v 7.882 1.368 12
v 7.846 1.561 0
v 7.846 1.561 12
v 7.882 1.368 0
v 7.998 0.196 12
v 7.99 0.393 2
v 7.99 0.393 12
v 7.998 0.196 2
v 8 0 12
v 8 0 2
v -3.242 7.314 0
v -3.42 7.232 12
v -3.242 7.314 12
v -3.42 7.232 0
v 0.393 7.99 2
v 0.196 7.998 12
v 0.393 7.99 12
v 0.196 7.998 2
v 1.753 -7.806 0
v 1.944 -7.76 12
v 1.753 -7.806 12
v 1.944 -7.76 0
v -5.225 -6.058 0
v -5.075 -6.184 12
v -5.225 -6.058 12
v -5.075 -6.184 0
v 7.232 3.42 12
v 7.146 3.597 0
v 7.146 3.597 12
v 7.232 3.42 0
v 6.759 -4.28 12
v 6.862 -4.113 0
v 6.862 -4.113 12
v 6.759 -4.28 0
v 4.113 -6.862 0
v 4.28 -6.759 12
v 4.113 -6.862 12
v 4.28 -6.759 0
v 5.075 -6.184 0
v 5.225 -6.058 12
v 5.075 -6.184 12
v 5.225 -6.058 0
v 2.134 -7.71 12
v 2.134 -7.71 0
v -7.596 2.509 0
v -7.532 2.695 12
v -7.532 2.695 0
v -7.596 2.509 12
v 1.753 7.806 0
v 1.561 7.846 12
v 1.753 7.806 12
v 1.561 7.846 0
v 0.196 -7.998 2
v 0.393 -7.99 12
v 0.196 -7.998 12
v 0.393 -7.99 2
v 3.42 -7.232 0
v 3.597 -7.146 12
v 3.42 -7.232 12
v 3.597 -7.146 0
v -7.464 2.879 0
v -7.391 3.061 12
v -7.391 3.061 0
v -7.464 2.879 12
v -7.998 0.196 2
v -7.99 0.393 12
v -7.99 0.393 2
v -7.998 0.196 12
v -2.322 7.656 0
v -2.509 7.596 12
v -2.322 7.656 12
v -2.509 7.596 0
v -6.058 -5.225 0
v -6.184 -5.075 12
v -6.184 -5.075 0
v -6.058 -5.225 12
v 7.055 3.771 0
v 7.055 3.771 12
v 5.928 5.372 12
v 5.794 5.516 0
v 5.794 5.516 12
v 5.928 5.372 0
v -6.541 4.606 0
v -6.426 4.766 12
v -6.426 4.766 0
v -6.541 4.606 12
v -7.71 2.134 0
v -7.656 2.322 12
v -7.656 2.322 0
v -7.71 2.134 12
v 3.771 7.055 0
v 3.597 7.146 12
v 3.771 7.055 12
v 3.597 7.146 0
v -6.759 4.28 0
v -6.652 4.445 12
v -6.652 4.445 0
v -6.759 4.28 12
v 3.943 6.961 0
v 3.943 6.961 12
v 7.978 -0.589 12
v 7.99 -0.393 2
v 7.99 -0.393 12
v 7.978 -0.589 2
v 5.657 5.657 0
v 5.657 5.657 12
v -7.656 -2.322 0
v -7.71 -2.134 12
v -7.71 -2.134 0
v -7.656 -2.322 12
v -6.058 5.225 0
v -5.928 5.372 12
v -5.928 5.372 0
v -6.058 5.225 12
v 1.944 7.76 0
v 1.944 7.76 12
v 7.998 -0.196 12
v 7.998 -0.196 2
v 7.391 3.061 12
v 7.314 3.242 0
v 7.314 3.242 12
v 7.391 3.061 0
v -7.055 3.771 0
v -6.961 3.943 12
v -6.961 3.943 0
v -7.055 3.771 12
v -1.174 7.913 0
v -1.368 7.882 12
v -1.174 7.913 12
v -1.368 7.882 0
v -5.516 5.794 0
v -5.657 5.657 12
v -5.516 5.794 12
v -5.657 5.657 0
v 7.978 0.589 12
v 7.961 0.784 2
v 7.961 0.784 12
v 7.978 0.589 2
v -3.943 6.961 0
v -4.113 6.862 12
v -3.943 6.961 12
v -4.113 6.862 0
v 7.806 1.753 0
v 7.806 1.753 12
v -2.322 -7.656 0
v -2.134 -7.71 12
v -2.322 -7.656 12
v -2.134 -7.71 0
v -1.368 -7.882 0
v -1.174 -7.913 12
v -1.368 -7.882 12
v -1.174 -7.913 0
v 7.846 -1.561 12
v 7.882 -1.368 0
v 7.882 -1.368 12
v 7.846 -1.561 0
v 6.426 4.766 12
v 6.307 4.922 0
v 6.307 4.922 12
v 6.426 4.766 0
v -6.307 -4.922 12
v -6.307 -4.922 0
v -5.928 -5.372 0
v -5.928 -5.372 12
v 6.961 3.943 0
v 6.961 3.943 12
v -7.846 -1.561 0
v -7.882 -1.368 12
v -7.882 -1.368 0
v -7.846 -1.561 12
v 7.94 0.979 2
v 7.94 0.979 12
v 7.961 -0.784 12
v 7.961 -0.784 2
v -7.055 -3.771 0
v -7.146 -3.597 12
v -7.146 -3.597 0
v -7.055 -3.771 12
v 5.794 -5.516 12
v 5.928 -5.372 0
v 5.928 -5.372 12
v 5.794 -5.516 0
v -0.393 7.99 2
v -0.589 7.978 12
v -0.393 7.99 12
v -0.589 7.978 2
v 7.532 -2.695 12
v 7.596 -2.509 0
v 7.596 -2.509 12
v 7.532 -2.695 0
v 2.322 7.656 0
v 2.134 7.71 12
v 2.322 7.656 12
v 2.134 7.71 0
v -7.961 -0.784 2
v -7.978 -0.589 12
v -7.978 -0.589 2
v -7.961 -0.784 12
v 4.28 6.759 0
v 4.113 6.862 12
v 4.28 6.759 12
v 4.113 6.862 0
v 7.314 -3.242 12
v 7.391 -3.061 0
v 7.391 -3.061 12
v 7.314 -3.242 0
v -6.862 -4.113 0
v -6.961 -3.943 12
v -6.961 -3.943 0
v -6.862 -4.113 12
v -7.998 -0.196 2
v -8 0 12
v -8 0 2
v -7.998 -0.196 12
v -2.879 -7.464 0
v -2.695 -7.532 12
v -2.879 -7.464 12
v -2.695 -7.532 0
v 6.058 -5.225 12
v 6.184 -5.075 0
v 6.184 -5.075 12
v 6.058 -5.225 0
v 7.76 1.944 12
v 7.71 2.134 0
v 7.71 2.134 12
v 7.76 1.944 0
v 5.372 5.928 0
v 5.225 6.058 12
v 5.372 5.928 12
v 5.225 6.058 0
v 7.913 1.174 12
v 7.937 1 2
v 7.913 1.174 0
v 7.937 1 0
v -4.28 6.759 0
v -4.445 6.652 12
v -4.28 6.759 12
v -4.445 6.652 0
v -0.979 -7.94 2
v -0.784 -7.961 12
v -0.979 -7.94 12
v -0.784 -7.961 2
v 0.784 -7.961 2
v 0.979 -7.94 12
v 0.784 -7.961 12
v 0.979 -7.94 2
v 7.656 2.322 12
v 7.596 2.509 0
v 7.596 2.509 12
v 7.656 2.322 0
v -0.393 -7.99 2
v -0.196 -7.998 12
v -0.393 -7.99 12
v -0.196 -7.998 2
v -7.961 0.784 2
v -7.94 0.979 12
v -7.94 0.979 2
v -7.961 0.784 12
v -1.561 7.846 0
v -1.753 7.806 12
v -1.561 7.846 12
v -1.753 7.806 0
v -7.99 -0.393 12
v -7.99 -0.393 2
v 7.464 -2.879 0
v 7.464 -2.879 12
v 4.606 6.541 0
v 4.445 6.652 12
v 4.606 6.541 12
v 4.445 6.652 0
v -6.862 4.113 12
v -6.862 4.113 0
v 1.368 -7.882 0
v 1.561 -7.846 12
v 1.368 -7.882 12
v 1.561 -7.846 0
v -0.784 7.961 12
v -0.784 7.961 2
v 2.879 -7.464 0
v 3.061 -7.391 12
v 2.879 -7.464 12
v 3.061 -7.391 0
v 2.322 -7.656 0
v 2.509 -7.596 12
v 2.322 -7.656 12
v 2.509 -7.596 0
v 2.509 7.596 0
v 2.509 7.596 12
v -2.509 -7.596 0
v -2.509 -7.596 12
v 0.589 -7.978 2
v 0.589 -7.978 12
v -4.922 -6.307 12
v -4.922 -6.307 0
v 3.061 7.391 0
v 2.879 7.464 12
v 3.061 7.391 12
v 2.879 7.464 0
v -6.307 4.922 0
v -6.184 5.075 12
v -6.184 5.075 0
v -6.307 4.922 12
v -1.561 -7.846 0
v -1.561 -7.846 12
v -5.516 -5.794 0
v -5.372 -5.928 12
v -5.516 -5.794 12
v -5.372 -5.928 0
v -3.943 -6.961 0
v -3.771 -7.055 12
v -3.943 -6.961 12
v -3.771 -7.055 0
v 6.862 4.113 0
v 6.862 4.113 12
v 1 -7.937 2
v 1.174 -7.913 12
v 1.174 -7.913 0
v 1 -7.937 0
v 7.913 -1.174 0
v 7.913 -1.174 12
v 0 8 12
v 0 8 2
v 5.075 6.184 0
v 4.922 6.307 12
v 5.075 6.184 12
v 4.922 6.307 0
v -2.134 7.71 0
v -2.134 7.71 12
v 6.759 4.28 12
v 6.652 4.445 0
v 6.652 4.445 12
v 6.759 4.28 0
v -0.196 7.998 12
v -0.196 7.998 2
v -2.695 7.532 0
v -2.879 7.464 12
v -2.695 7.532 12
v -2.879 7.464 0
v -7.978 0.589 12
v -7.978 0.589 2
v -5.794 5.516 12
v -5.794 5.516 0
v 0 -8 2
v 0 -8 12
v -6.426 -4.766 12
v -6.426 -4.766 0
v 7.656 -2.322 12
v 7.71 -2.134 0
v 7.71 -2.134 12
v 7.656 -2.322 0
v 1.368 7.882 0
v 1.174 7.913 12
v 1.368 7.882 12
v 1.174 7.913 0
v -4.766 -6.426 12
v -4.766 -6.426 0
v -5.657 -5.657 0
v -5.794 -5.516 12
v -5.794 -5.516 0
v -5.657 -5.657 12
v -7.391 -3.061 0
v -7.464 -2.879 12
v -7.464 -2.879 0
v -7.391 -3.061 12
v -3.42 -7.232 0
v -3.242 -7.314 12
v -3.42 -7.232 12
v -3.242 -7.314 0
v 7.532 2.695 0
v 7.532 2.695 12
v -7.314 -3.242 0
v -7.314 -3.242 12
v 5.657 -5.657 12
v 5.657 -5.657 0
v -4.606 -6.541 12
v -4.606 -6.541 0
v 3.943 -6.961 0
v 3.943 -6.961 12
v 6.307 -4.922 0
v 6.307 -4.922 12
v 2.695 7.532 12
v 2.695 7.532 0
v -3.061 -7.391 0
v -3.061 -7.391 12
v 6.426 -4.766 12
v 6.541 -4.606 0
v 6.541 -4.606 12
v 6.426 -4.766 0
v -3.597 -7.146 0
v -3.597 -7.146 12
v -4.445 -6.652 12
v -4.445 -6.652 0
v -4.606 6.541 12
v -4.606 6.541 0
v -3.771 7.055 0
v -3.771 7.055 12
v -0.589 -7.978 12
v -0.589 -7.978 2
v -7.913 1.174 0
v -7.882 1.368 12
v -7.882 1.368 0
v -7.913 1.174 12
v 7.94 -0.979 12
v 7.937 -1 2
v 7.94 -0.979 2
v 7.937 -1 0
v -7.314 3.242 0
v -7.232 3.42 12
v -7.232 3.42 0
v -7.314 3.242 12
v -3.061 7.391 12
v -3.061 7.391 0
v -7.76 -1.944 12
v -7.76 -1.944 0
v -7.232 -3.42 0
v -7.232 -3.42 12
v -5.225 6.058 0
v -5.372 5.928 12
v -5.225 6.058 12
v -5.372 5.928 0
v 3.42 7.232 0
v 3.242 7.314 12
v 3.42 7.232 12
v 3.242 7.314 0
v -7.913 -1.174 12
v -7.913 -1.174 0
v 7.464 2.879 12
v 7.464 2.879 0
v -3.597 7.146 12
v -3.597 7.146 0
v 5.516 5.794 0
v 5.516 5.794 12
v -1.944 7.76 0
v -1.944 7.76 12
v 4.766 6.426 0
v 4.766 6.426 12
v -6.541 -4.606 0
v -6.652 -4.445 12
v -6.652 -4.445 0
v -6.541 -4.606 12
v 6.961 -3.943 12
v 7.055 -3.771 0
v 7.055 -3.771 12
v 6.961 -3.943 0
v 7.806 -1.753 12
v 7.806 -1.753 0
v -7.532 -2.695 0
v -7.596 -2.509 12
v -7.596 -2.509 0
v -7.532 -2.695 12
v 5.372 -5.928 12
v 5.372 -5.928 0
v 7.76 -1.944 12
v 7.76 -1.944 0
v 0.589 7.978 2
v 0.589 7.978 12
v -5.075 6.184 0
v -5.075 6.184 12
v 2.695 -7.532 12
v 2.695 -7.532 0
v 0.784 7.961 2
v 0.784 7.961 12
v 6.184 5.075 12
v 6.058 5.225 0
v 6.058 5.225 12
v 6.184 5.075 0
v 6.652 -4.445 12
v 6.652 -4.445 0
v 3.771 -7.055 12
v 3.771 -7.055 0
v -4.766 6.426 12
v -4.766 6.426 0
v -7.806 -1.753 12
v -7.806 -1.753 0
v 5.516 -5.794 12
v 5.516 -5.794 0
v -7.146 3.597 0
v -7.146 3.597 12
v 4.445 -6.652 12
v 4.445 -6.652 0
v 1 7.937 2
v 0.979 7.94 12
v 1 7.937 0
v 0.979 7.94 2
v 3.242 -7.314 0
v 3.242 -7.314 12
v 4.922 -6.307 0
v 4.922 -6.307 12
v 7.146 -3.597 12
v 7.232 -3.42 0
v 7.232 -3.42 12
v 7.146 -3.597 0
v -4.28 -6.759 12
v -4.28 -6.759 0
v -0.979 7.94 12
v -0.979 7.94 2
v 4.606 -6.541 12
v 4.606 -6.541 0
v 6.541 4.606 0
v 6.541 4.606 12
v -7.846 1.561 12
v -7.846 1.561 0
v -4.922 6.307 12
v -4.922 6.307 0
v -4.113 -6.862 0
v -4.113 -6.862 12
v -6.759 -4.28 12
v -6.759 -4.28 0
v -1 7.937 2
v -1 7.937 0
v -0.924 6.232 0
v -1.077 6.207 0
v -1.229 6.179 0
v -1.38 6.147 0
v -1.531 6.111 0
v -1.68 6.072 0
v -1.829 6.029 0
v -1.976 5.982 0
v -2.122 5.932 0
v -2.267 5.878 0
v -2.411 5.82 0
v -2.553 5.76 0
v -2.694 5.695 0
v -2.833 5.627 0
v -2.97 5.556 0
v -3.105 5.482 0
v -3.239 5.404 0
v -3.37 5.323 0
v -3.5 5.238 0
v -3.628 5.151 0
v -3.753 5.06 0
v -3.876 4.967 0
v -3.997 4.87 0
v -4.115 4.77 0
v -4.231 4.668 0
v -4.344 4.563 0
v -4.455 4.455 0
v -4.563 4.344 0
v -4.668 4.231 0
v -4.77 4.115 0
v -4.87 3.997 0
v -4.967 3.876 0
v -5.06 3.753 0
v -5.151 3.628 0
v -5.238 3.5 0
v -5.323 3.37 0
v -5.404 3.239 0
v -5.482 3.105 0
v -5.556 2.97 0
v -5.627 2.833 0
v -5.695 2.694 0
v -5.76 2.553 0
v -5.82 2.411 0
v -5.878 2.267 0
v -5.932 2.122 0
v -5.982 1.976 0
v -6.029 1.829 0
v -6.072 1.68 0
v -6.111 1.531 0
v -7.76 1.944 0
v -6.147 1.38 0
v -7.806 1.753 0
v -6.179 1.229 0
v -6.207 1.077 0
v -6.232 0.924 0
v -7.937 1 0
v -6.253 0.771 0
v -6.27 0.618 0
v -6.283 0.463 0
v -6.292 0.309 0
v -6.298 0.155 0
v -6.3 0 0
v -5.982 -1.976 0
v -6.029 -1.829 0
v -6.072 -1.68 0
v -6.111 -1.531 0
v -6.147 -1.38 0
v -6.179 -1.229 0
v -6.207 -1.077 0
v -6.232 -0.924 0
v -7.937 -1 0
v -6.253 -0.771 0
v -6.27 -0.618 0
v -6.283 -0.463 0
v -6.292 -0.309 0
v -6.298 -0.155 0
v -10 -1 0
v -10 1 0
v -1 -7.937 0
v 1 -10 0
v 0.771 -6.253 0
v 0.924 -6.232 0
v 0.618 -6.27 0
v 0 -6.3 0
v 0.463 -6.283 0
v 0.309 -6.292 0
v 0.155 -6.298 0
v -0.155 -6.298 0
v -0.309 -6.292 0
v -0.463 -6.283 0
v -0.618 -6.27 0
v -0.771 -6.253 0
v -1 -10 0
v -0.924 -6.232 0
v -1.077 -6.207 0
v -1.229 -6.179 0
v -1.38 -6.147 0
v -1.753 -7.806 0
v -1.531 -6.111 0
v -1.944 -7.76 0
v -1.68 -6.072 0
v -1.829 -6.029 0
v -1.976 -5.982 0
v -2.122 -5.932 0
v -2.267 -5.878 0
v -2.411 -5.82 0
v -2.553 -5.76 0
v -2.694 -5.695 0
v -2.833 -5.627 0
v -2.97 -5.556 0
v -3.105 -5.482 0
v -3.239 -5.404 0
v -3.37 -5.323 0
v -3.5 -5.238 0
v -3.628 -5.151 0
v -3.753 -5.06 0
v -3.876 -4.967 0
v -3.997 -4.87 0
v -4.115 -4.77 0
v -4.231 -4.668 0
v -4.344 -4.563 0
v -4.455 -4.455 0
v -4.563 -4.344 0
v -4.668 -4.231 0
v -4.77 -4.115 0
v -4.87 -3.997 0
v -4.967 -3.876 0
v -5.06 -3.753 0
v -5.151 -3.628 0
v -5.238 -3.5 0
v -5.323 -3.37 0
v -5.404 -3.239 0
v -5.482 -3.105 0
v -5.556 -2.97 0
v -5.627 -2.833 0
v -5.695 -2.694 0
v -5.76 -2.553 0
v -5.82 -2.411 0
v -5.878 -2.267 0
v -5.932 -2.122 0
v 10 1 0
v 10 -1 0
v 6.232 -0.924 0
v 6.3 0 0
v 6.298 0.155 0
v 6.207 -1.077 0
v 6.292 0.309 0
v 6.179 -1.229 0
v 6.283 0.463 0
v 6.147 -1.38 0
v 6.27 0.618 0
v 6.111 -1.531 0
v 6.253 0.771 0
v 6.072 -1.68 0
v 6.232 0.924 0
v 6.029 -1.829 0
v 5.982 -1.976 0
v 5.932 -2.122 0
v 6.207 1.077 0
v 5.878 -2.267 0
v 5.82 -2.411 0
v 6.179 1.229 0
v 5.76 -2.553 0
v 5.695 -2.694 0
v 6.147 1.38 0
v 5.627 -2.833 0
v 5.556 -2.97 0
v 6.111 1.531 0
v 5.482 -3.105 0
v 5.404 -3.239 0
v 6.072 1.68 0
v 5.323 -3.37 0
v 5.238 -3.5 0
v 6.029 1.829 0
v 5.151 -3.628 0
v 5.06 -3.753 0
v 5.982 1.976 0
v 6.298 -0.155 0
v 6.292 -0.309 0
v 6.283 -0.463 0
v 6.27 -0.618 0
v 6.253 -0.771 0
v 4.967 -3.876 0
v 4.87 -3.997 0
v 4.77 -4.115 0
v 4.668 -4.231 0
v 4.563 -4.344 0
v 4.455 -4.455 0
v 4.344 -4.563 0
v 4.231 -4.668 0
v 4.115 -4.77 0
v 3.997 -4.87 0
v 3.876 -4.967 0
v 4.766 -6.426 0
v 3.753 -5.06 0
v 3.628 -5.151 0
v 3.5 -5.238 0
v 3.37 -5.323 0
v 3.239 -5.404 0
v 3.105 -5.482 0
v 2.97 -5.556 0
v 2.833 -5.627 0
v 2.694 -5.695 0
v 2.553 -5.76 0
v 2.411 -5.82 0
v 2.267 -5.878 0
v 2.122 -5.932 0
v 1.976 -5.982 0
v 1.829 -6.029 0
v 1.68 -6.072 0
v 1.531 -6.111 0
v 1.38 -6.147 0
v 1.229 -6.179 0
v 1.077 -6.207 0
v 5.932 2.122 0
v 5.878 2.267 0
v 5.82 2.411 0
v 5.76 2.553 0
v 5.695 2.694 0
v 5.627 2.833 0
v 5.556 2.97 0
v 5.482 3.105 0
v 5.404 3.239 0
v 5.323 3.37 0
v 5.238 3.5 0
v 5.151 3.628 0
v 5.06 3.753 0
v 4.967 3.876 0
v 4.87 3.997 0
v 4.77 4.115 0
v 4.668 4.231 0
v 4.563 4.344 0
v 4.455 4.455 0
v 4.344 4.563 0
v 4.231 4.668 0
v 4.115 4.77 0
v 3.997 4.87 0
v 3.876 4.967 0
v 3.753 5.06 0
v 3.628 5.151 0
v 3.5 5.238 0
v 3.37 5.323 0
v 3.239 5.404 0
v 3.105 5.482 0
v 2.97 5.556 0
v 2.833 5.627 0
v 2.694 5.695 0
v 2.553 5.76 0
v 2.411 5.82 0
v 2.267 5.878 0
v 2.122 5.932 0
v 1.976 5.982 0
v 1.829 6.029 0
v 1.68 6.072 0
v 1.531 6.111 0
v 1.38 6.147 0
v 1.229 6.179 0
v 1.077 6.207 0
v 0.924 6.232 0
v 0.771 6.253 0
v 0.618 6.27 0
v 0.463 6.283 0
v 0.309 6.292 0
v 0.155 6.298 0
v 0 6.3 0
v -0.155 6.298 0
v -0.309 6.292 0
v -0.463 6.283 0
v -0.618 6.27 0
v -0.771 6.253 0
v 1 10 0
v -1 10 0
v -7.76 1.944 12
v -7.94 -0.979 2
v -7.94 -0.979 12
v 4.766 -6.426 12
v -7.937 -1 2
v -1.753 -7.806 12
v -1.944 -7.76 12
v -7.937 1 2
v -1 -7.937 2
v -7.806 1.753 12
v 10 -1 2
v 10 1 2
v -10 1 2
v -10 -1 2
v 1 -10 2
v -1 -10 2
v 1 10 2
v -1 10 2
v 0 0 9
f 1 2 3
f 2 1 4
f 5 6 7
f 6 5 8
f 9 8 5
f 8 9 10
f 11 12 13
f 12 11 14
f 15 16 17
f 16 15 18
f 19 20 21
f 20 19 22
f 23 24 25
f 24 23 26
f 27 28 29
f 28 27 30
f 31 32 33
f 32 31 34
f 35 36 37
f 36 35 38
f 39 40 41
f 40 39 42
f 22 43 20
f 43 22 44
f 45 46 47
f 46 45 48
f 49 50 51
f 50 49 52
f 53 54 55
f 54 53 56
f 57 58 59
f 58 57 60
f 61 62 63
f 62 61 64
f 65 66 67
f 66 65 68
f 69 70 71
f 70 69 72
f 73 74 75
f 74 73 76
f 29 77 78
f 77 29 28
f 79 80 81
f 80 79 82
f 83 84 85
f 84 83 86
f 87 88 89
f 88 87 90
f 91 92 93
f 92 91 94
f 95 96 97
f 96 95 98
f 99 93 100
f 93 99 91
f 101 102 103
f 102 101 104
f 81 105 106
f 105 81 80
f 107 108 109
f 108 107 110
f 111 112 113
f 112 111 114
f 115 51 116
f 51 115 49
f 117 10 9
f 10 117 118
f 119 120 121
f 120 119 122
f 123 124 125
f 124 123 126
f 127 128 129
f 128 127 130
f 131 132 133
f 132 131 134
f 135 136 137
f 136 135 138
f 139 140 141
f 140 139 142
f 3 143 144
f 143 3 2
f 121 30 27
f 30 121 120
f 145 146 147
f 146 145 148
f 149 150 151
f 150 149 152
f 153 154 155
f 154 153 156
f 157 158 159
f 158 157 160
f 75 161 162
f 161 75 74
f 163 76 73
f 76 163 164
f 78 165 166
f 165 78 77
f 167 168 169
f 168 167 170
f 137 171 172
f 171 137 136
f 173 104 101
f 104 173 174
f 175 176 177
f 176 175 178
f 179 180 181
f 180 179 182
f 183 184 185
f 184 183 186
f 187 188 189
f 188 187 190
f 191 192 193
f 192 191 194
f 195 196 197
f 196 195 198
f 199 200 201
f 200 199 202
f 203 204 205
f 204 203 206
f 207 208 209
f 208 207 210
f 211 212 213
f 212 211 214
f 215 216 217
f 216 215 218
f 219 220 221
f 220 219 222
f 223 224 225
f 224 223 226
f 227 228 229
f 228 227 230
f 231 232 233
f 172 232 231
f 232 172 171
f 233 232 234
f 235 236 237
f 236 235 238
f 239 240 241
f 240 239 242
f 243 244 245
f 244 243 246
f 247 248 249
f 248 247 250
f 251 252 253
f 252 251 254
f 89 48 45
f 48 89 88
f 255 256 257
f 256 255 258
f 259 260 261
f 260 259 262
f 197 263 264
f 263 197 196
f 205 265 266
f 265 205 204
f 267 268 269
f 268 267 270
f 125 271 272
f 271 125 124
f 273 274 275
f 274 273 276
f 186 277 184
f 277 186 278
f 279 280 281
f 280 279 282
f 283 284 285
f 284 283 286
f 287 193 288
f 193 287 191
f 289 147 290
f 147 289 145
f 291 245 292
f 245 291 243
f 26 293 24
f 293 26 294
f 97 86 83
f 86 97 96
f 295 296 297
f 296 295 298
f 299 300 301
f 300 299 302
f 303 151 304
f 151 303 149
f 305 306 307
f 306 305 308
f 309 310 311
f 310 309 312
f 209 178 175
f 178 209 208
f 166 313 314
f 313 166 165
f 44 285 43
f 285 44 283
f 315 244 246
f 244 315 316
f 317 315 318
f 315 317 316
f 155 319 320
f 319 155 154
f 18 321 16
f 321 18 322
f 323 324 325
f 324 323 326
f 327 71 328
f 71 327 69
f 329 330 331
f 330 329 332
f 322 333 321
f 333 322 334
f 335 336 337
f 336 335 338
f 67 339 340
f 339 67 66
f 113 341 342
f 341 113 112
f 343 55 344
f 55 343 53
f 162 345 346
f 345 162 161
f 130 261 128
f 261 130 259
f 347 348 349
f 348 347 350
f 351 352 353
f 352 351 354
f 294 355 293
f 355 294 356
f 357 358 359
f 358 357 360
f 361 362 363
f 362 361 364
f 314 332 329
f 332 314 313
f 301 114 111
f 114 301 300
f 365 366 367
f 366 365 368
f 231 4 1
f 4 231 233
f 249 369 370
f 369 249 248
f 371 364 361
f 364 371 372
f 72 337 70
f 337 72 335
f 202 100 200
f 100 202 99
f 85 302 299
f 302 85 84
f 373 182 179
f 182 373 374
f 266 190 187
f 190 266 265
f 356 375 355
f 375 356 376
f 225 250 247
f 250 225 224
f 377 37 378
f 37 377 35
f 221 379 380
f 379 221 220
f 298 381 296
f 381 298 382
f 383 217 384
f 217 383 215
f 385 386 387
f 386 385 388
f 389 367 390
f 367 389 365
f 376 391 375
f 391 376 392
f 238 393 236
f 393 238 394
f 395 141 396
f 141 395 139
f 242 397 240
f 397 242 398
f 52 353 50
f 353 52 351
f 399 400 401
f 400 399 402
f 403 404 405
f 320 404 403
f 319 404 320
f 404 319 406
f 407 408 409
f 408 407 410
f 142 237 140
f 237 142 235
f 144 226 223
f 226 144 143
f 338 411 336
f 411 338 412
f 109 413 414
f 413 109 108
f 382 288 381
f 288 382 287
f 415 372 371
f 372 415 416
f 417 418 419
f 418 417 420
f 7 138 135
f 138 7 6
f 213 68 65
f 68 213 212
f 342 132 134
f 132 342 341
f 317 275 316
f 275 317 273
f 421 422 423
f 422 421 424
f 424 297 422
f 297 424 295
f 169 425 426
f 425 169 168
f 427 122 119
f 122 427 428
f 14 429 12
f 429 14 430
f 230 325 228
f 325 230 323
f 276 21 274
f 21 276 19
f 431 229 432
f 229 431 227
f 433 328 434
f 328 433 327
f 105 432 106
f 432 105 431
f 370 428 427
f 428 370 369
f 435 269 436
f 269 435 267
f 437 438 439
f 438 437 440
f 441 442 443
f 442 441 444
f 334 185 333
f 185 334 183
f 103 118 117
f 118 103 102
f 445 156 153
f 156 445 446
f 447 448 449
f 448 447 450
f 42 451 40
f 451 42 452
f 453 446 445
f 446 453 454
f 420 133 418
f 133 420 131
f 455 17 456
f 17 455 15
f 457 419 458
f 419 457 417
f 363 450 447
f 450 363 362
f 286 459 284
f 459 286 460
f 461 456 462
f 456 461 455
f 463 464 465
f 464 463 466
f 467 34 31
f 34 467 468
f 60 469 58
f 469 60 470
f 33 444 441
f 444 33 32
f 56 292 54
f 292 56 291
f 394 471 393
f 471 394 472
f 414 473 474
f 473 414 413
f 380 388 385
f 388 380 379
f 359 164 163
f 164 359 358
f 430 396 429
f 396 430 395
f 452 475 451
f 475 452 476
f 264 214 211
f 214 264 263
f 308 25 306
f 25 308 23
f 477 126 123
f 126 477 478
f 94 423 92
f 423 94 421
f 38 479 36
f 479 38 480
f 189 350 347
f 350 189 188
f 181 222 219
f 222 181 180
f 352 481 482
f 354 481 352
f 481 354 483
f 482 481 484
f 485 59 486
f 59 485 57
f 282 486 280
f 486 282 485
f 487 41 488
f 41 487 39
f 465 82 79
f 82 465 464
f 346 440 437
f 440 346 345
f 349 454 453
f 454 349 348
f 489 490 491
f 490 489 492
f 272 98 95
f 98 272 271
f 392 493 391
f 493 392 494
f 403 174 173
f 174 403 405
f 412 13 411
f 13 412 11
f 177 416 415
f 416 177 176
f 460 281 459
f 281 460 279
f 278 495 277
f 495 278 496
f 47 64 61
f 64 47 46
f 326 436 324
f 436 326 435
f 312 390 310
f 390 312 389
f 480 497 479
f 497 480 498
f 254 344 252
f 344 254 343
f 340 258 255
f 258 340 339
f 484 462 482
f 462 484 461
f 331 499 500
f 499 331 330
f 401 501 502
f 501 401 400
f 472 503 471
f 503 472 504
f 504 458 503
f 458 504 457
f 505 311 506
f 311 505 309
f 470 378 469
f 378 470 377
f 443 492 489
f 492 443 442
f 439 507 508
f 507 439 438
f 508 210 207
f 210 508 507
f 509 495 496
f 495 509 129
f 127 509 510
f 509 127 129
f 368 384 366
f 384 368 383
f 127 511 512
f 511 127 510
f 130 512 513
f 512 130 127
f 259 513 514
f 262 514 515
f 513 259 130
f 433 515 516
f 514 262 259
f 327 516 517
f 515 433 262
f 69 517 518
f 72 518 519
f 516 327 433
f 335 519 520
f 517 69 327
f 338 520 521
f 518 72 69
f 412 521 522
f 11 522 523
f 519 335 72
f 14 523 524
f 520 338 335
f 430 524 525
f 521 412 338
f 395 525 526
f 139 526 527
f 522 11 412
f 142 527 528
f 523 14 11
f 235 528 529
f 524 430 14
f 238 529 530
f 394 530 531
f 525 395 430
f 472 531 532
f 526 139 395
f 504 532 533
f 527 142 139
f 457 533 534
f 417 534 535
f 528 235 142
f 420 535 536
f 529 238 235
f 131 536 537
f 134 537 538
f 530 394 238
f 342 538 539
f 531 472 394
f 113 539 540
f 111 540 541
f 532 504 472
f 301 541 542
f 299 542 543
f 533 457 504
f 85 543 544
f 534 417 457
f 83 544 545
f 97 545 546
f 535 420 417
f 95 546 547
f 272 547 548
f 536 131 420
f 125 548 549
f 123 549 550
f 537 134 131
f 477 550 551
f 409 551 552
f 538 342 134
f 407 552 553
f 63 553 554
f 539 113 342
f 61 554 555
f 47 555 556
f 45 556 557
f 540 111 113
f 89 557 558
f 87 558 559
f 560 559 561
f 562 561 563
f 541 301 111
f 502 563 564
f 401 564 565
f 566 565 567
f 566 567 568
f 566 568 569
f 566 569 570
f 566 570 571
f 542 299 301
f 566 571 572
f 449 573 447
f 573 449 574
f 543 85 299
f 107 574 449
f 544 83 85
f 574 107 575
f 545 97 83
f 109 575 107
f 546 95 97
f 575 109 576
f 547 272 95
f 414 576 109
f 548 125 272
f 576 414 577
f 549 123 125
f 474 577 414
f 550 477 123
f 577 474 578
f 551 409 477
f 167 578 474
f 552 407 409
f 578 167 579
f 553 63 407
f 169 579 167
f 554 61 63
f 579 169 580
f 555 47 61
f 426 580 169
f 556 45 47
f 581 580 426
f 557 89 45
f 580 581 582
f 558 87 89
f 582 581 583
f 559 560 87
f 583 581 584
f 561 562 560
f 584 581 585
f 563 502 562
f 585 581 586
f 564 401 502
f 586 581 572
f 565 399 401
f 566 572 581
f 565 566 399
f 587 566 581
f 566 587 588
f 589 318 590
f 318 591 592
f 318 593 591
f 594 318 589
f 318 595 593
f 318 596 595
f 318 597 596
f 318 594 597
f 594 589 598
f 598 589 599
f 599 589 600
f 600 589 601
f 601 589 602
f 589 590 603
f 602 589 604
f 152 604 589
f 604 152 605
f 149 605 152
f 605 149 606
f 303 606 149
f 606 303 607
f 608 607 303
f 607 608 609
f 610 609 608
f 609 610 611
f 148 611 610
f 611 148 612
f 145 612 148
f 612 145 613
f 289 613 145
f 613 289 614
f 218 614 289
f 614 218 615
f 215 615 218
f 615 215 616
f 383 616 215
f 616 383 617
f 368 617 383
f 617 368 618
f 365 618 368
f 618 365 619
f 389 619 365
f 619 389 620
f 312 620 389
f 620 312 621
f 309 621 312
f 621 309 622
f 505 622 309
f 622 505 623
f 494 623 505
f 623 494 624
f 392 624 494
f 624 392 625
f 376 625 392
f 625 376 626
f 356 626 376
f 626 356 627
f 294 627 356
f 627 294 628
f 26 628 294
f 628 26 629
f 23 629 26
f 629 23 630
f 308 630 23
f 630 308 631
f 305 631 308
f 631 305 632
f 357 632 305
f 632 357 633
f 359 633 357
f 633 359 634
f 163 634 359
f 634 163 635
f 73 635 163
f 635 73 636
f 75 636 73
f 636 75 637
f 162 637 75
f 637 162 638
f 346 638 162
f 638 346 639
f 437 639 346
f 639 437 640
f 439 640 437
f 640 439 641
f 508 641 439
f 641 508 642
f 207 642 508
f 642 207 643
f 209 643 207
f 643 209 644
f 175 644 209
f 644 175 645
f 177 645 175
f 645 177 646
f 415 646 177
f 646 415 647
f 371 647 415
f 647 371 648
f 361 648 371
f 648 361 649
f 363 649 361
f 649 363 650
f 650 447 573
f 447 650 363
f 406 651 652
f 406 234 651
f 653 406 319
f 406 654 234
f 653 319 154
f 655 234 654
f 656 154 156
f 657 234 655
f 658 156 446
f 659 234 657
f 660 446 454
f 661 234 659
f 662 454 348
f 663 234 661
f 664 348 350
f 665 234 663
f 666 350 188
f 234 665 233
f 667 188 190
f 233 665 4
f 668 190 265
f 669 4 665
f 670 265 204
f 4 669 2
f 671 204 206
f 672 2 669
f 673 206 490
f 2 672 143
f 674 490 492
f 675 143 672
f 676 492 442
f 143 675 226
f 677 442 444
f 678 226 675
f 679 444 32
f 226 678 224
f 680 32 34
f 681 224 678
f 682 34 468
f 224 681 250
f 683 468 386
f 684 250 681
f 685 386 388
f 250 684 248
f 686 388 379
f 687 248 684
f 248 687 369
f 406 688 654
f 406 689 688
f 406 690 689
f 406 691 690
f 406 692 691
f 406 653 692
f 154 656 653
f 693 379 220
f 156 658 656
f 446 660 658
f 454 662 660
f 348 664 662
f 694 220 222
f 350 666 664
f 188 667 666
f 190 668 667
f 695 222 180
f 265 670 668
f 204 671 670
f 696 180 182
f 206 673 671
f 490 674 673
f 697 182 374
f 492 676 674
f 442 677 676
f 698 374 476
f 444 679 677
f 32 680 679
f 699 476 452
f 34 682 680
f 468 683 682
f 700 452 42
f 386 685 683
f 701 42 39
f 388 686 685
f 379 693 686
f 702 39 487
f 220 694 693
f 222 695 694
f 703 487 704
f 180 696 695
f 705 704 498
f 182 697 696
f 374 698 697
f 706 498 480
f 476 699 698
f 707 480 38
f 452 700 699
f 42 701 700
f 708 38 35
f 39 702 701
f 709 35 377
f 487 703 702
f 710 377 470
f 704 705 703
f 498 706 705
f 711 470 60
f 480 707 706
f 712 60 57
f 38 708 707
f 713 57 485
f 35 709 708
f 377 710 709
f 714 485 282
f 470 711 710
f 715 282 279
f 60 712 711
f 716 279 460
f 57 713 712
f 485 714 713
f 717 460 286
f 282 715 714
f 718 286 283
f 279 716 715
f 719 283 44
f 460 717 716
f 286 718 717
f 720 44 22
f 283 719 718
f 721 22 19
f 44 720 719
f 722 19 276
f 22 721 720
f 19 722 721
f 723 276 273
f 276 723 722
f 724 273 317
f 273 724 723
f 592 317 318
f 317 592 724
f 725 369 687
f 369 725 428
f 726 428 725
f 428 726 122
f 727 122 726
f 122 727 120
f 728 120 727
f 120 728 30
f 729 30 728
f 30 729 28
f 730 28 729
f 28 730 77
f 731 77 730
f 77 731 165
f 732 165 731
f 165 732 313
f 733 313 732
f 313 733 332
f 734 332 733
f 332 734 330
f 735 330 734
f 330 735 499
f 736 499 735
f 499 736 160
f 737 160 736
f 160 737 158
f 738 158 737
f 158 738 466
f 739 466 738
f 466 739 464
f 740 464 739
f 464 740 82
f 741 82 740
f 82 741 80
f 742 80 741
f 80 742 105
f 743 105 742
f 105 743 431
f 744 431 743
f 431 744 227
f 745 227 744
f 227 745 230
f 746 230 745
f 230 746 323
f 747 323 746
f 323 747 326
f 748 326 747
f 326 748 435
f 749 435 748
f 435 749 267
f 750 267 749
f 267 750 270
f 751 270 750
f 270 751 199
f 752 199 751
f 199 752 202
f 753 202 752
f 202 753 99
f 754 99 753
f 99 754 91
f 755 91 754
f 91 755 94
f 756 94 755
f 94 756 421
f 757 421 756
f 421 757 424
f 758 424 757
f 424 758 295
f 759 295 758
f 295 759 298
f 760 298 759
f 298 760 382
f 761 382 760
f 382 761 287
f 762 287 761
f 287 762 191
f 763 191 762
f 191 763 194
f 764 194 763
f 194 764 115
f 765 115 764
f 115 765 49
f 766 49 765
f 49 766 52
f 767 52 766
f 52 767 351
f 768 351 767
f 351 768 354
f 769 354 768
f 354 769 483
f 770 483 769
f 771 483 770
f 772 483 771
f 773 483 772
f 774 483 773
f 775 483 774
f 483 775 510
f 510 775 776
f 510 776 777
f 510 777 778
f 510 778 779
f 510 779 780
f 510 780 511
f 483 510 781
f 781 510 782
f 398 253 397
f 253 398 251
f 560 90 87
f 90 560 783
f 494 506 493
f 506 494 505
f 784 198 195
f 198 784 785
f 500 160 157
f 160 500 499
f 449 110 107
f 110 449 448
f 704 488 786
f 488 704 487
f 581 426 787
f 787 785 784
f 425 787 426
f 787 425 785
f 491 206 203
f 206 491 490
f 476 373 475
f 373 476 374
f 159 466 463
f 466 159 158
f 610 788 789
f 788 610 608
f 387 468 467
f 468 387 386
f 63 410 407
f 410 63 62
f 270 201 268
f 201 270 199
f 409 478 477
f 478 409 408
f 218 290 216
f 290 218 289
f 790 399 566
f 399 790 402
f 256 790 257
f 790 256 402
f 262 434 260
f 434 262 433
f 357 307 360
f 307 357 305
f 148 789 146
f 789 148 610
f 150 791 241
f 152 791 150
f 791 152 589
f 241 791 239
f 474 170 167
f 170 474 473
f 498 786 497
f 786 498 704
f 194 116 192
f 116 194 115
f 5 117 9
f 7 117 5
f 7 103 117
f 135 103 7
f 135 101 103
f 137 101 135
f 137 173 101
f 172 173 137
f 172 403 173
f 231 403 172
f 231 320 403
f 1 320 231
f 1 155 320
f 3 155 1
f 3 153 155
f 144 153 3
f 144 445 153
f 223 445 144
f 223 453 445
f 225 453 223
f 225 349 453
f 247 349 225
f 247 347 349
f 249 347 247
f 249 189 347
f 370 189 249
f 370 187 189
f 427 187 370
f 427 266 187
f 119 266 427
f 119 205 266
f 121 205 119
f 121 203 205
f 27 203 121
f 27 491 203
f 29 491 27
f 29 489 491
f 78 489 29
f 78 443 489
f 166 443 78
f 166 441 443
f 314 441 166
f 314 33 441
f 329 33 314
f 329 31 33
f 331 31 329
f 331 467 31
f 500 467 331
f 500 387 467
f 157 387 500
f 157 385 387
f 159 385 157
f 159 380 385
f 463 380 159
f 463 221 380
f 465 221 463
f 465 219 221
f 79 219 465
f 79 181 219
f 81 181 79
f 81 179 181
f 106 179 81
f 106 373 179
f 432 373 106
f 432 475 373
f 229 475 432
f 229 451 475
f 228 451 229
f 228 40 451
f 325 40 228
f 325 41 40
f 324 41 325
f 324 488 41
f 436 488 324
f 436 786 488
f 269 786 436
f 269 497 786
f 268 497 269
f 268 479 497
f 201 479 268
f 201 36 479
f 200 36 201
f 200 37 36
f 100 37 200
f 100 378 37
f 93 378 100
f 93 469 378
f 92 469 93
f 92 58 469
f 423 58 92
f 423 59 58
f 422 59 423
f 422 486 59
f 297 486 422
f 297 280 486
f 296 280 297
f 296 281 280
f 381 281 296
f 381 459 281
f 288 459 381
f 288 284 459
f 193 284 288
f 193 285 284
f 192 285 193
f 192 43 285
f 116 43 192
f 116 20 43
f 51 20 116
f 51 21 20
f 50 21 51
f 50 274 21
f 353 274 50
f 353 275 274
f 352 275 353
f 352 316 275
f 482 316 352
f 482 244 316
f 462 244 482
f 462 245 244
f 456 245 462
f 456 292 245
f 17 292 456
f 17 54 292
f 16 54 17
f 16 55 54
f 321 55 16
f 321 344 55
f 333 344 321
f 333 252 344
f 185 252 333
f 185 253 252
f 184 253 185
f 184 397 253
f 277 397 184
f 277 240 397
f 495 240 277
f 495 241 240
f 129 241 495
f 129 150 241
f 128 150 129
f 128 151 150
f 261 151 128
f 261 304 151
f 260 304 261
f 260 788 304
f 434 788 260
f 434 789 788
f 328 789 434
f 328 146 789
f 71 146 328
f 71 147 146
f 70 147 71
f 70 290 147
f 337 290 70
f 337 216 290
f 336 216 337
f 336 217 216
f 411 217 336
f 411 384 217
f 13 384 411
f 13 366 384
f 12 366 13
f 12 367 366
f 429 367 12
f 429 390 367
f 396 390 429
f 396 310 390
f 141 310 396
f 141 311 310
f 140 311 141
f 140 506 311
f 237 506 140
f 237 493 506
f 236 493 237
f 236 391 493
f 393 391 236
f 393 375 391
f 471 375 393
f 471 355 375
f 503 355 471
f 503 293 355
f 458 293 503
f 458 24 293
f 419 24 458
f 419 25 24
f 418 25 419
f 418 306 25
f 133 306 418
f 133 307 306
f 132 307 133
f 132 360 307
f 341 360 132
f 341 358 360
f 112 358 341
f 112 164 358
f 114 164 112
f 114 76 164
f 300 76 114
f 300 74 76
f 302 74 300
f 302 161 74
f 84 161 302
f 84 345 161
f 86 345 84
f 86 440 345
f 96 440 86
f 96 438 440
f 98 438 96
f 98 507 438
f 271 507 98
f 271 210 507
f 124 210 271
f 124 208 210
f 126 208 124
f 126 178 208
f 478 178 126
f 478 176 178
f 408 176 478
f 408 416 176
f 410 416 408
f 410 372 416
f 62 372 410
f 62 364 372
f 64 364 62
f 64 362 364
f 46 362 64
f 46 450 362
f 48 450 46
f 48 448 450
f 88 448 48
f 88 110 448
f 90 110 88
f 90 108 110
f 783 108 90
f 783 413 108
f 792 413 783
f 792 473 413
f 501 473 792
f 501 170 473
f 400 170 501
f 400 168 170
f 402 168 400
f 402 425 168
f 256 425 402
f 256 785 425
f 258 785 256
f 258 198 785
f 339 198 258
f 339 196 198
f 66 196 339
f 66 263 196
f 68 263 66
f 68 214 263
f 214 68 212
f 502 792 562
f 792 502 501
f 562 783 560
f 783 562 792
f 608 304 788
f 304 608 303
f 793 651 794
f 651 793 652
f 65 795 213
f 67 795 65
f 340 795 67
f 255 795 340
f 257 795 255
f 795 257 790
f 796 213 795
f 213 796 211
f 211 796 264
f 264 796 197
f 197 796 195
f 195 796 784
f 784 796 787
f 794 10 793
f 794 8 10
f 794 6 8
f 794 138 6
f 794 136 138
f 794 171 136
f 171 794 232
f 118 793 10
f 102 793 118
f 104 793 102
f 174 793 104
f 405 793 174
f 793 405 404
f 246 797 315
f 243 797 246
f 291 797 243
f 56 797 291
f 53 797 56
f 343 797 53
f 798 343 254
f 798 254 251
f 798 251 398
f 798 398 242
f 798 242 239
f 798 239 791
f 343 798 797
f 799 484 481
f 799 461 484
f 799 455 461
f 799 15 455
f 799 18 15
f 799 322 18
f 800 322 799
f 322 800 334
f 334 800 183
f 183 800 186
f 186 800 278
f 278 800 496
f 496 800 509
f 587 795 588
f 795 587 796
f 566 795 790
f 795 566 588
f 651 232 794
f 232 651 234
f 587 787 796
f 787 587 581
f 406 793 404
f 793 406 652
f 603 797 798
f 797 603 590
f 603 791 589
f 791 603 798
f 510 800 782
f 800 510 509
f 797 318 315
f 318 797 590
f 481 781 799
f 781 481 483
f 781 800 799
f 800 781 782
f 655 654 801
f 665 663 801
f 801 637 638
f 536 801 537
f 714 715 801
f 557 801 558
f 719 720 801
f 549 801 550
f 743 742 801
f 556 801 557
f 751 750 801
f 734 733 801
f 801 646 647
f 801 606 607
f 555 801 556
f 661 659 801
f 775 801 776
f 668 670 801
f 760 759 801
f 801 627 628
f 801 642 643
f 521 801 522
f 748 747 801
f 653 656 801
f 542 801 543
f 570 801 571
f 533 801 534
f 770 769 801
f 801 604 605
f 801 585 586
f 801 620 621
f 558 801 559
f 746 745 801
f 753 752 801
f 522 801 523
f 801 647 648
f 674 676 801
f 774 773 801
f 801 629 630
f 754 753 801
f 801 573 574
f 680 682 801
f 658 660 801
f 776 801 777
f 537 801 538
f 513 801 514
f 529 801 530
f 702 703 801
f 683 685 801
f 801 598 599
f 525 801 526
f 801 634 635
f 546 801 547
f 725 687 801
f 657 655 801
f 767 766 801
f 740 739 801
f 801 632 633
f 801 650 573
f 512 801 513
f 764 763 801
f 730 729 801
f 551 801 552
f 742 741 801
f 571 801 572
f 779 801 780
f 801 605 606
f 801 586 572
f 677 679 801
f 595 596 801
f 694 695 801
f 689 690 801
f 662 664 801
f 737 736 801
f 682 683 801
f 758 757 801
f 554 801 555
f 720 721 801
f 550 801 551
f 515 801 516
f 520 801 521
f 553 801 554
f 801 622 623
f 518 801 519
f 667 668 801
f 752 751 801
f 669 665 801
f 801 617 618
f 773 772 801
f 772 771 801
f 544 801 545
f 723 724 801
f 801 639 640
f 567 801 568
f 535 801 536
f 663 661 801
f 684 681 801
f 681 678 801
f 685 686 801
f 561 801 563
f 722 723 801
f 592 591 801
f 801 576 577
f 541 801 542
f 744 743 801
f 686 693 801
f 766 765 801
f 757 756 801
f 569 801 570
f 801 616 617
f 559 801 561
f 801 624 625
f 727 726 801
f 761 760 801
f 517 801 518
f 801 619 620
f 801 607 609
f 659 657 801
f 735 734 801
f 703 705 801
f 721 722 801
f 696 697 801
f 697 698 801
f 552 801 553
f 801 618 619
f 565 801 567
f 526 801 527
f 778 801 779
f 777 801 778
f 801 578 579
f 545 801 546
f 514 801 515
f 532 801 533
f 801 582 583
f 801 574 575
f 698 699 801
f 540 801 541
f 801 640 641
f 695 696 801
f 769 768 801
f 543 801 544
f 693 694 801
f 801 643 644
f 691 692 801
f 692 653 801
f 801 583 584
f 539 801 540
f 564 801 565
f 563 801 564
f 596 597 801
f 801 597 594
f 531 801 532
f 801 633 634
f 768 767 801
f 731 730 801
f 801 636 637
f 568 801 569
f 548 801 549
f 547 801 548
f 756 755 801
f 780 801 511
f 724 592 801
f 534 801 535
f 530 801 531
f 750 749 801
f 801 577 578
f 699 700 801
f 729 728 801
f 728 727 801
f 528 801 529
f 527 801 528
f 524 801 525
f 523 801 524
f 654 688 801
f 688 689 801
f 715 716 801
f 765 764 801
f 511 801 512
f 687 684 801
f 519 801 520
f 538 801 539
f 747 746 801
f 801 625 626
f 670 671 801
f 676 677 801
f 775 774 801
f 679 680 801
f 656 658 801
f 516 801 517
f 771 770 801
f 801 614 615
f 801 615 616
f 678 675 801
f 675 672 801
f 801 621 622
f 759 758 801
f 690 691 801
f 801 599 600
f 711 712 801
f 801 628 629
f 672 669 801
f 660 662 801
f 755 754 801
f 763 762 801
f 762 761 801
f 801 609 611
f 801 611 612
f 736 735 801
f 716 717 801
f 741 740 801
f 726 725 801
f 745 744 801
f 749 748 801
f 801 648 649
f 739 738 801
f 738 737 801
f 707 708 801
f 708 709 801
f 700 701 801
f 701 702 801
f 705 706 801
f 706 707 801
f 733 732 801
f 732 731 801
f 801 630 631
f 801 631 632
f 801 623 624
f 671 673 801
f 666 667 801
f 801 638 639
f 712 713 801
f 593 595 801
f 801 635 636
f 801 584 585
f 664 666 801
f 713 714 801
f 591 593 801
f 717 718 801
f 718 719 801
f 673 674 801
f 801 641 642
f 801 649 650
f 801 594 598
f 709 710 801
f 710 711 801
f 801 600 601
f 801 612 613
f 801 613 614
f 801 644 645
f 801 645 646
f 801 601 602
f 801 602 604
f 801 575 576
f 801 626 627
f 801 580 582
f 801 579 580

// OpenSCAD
$fn=256;

difference()
{
    union()
    {
        cylinder(d=16,h=12);
        
        translate([-10,-1,0])
        cube([20,2,2]);
        
        rotate([0,0,90])
        translate([-10,-1,0])
        cube([20,2,2]);
    }
    
    translate([0,0,-1])
    cylinder(d1=14,d2=0,h=10);
    
    //Test
    //translate([-20,0,-1])
    //cube([40,40,40]);
}
